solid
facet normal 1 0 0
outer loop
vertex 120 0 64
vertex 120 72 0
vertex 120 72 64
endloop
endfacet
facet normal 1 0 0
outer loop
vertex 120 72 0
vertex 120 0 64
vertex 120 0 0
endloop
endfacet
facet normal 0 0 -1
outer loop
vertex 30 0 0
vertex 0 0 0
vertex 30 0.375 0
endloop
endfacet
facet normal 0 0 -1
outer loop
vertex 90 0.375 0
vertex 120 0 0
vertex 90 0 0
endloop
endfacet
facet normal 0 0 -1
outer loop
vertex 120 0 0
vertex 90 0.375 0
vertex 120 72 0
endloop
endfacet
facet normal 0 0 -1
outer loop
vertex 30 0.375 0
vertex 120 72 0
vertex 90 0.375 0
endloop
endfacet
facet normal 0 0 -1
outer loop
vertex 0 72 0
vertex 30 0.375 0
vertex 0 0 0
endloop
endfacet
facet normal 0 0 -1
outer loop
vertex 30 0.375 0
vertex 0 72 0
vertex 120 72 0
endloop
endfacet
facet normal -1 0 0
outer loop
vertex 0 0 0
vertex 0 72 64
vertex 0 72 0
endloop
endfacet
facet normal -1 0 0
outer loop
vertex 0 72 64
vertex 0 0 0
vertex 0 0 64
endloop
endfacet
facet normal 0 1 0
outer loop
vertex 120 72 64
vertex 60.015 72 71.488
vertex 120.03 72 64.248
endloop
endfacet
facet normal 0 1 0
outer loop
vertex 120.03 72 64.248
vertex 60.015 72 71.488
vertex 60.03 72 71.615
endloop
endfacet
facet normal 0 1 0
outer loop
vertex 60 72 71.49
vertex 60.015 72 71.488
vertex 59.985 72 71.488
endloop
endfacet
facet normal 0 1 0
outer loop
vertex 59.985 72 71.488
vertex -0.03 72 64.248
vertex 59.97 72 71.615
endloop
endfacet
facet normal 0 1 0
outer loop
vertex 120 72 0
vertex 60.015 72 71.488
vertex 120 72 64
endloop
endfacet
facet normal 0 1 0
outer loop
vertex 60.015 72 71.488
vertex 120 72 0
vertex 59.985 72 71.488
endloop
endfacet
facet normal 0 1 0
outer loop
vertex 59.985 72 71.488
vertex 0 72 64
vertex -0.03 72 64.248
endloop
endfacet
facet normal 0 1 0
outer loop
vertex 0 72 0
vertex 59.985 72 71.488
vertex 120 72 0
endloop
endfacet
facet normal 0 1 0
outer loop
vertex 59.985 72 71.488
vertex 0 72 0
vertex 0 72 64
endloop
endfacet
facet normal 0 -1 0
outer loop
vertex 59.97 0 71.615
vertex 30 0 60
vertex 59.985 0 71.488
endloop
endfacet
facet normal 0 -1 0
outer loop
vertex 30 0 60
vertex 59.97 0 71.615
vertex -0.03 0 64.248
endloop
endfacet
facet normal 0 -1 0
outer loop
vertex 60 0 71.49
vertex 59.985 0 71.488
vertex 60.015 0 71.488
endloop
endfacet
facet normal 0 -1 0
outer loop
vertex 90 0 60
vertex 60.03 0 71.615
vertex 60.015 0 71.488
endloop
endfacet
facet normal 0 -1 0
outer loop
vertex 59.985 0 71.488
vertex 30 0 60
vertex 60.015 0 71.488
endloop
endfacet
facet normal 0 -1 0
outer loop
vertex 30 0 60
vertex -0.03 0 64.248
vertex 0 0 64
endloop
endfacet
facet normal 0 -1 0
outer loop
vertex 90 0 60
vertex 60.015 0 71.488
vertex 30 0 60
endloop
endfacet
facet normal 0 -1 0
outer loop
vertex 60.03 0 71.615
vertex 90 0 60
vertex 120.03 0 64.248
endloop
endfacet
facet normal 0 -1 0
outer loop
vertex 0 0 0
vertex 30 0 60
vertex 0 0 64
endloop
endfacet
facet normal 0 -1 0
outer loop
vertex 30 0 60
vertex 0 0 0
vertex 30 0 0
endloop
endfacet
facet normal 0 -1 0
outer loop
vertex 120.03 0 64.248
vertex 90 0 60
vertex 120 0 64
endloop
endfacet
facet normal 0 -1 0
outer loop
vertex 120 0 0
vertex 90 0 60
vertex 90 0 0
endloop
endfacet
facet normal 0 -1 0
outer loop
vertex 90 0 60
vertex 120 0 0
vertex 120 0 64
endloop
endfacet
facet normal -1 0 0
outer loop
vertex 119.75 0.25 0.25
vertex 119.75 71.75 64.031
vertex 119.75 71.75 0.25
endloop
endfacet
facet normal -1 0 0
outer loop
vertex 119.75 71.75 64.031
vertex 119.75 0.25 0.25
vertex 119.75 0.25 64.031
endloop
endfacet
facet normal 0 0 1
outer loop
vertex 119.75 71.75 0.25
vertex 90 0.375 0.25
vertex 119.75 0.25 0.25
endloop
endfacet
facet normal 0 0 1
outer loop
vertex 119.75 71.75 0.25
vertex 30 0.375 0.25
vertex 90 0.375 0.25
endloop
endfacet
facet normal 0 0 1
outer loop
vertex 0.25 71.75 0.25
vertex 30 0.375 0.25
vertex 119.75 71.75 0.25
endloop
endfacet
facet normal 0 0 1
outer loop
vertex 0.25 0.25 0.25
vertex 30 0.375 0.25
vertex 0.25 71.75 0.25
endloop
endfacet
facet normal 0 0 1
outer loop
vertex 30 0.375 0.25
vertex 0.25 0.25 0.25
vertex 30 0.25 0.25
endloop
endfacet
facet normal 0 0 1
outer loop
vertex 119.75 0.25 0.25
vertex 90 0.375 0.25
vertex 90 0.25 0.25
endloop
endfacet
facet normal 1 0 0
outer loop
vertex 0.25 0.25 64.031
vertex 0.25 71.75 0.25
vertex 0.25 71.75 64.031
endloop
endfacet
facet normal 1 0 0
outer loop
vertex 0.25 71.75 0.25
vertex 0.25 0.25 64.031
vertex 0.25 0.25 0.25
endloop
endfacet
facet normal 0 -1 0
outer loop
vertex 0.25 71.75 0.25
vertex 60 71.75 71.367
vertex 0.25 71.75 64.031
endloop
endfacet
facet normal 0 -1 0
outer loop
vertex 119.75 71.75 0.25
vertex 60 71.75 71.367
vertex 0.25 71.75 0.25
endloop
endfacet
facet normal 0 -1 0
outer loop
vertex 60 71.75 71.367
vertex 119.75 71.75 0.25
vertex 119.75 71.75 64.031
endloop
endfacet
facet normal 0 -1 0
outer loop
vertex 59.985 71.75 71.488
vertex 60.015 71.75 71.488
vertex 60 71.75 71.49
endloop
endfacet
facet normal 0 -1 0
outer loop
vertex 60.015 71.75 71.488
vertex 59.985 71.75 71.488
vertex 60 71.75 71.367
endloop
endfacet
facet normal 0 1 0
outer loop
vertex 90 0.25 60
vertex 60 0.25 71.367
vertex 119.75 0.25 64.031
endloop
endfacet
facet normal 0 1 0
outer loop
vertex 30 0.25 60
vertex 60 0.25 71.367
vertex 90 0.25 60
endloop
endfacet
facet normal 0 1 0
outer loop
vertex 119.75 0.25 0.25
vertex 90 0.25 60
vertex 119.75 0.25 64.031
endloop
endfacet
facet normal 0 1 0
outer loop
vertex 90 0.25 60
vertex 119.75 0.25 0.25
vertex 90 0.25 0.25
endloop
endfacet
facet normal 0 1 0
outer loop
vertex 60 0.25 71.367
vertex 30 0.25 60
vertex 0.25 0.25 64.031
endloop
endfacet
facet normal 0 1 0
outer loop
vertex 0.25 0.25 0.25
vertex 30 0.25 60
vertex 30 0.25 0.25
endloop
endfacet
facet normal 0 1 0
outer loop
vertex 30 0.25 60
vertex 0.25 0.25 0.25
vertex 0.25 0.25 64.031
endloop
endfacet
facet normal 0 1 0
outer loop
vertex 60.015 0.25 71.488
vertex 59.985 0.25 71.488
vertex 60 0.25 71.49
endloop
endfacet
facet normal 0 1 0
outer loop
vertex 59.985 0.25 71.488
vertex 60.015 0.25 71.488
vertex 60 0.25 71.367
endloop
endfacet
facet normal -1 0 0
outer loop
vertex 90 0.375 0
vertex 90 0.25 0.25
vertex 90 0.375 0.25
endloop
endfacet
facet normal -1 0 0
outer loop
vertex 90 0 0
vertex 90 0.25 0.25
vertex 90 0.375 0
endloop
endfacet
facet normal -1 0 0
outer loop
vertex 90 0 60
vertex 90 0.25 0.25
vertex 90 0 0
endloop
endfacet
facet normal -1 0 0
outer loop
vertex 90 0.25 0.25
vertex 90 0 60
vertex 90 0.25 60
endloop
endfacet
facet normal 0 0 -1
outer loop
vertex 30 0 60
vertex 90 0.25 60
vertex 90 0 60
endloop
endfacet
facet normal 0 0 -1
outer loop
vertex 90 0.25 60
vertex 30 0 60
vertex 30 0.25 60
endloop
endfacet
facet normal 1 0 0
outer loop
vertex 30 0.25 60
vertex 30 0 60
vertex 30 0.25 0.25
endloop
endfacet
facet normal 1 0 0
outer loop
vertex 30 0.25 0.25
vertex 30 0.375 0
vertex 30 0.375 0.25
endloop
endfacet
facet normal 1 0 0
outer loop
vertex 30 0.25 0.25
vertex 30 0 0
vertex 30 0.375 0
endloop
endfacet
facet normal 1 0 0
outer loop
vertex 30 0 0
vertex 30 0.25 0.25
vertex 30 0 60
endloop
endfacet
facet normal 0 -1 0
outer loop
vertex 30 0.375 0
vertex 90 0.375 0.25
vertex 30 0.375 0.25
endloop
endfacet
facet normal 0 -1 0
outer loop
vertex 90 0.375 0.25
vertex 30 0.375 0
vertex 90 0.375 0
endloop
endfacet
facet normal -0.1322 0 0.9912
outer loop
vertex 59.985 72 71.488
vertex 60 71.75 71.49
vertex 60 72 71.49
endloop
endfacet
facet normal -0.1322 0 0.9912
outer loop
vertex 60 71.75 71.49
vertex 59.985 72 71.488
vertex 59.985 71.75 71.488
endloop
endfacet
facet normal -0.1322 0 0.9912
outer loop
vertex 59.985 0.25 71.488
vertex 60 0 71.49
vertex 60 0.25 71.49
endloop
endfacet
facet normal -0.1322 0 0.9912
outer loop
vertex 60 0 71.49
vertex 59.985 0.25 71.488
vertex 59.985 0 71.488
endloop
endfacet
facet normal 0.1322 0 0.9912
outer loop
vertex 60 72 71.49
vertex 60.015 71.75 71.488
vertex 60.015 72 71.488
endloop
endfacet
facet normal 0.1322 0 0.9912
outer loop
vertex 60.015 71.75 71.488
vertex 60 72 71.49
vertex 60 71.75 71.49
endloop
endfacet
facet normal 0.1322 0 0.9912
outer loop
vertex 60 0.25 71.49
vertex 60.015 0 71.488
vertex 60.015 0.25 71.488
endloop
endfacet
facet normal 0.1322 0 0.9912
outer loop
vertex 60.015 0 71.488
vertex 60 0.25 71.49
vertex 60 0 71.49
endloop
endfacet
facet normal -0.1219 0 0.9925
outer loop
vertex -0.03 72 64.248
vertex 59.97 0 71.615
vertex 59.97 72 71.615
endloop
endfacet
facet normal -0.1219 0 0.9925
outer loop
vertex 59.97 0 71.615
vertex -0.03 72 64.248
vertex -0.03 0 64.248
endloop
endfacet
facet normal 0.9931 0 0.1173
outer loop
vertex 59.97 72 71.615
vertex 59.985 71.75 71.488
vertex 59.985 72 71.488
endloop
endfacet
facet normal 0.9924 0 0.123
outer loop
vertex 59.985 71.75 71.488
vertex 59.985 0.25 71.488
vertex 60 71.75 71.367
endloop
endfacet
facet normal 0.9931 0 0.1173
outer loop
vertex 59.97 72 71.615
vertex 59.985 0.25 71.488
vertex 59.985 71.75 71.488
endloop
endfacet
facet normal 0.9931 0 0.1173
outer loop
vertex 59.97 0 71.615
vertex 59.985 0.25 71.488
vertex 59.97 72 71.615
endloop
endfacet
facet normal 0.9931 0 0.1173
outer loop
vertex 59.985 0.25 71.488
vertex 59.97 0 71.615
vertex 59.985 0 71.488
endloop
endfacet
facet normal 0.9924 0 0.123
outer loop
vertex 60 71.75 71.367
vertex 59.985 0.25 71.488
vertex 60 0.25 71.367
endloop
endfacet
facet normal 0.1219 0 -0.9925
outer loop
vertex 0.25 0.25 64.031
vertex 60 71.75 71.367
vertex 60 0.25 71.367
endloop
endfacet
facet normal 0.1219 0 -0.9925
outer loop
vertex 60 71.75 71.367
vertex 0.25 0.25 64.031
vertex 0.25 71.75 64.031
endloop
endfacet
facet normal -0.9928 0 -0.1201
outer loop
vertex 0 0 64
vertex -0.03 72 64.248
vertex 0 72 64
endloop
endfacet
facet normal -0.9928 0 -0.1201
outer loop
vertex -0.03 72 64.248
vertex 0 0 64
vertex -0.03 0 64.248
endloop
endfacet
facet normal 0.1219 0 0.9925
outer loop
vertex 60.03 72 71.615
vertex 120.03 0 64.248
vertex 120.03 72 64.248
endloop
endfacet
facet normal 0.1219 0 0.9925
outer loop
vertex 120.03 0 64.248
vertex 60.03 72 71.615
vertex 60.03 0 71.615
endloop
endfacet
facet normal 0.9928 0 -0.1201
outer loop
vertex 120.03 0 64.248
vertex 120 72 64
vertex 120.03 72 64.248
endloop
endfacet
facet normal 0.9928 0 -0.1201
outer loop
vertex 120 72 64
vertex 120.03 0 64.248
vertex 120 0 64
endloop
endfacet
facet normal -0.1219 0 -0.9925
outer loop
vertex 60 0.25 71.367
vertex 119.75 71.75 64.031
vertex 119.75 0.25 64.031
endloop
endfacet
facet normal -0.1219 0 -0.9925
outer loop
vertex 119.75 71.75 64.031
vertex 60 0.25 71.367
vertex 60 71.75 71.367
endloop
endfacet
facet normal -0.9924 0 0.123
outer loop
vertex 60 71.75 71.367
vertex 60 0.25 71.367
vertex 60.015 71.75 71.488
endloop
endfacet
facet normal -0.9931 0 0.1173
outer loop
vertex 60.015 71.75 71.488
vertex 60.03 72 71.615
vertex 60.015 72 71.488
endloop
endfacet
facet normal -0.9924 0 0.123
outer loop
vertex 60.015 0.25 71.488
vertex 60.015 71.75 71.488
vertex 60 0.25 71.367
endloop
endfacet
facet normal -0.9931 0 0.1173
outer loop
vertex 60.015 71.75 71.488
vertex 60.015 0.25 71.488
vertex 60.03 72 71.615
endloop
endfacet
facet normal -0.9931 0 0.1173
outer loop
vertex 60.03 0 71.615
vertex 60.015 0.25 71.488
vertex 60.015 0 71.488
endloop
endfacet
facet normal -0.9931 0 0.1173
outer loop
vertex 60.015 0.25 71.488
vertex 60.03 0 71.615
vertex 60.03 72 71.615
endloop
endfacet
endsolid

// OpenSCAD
$fn = 200;

shed_outer = [10*12,6*12,6*12];
wall = 1/4;

shed_inner = shed_outer - [2*wall,2*wall,2*wall];

door = [shed_outer[0]/2, 2*wall, shed_outer[2]-12];

module shed() {
    difference() {
        cube(shed_outer);
        translate([wall,wall,wall]) cube(shed_inner);
        translate([shed_outer[0]/2-door[0]/2,-wall/2,0]) 
            cube(door);
        translate([-1,-1,shed_outer[2]-8]) rotate([0,-7,0]) cube(shed_outer+[4,4,4]);
        translate([shed_outer[0]+2-1,-1,shed_outer[2]-8]) mirror() rotate([0,-7,0]) cube(shed_outer+[4,4,4]);
    }
    translate([0,0,shed_outer[2]-8]) rotate([0,-7,0]) cube([(shed_outer[0]/2)/cos(7),shed_outer[1],wall]);
    translate([shed_outer[0],0,shed_outer[2]-8]) mirror() rotate([0,-7,0]) cube([(shed_outer[0]/2)/cos(7),shed_outer[1],wall]);
}

function shed_dim() = shed_outer;

shed(); 
    
